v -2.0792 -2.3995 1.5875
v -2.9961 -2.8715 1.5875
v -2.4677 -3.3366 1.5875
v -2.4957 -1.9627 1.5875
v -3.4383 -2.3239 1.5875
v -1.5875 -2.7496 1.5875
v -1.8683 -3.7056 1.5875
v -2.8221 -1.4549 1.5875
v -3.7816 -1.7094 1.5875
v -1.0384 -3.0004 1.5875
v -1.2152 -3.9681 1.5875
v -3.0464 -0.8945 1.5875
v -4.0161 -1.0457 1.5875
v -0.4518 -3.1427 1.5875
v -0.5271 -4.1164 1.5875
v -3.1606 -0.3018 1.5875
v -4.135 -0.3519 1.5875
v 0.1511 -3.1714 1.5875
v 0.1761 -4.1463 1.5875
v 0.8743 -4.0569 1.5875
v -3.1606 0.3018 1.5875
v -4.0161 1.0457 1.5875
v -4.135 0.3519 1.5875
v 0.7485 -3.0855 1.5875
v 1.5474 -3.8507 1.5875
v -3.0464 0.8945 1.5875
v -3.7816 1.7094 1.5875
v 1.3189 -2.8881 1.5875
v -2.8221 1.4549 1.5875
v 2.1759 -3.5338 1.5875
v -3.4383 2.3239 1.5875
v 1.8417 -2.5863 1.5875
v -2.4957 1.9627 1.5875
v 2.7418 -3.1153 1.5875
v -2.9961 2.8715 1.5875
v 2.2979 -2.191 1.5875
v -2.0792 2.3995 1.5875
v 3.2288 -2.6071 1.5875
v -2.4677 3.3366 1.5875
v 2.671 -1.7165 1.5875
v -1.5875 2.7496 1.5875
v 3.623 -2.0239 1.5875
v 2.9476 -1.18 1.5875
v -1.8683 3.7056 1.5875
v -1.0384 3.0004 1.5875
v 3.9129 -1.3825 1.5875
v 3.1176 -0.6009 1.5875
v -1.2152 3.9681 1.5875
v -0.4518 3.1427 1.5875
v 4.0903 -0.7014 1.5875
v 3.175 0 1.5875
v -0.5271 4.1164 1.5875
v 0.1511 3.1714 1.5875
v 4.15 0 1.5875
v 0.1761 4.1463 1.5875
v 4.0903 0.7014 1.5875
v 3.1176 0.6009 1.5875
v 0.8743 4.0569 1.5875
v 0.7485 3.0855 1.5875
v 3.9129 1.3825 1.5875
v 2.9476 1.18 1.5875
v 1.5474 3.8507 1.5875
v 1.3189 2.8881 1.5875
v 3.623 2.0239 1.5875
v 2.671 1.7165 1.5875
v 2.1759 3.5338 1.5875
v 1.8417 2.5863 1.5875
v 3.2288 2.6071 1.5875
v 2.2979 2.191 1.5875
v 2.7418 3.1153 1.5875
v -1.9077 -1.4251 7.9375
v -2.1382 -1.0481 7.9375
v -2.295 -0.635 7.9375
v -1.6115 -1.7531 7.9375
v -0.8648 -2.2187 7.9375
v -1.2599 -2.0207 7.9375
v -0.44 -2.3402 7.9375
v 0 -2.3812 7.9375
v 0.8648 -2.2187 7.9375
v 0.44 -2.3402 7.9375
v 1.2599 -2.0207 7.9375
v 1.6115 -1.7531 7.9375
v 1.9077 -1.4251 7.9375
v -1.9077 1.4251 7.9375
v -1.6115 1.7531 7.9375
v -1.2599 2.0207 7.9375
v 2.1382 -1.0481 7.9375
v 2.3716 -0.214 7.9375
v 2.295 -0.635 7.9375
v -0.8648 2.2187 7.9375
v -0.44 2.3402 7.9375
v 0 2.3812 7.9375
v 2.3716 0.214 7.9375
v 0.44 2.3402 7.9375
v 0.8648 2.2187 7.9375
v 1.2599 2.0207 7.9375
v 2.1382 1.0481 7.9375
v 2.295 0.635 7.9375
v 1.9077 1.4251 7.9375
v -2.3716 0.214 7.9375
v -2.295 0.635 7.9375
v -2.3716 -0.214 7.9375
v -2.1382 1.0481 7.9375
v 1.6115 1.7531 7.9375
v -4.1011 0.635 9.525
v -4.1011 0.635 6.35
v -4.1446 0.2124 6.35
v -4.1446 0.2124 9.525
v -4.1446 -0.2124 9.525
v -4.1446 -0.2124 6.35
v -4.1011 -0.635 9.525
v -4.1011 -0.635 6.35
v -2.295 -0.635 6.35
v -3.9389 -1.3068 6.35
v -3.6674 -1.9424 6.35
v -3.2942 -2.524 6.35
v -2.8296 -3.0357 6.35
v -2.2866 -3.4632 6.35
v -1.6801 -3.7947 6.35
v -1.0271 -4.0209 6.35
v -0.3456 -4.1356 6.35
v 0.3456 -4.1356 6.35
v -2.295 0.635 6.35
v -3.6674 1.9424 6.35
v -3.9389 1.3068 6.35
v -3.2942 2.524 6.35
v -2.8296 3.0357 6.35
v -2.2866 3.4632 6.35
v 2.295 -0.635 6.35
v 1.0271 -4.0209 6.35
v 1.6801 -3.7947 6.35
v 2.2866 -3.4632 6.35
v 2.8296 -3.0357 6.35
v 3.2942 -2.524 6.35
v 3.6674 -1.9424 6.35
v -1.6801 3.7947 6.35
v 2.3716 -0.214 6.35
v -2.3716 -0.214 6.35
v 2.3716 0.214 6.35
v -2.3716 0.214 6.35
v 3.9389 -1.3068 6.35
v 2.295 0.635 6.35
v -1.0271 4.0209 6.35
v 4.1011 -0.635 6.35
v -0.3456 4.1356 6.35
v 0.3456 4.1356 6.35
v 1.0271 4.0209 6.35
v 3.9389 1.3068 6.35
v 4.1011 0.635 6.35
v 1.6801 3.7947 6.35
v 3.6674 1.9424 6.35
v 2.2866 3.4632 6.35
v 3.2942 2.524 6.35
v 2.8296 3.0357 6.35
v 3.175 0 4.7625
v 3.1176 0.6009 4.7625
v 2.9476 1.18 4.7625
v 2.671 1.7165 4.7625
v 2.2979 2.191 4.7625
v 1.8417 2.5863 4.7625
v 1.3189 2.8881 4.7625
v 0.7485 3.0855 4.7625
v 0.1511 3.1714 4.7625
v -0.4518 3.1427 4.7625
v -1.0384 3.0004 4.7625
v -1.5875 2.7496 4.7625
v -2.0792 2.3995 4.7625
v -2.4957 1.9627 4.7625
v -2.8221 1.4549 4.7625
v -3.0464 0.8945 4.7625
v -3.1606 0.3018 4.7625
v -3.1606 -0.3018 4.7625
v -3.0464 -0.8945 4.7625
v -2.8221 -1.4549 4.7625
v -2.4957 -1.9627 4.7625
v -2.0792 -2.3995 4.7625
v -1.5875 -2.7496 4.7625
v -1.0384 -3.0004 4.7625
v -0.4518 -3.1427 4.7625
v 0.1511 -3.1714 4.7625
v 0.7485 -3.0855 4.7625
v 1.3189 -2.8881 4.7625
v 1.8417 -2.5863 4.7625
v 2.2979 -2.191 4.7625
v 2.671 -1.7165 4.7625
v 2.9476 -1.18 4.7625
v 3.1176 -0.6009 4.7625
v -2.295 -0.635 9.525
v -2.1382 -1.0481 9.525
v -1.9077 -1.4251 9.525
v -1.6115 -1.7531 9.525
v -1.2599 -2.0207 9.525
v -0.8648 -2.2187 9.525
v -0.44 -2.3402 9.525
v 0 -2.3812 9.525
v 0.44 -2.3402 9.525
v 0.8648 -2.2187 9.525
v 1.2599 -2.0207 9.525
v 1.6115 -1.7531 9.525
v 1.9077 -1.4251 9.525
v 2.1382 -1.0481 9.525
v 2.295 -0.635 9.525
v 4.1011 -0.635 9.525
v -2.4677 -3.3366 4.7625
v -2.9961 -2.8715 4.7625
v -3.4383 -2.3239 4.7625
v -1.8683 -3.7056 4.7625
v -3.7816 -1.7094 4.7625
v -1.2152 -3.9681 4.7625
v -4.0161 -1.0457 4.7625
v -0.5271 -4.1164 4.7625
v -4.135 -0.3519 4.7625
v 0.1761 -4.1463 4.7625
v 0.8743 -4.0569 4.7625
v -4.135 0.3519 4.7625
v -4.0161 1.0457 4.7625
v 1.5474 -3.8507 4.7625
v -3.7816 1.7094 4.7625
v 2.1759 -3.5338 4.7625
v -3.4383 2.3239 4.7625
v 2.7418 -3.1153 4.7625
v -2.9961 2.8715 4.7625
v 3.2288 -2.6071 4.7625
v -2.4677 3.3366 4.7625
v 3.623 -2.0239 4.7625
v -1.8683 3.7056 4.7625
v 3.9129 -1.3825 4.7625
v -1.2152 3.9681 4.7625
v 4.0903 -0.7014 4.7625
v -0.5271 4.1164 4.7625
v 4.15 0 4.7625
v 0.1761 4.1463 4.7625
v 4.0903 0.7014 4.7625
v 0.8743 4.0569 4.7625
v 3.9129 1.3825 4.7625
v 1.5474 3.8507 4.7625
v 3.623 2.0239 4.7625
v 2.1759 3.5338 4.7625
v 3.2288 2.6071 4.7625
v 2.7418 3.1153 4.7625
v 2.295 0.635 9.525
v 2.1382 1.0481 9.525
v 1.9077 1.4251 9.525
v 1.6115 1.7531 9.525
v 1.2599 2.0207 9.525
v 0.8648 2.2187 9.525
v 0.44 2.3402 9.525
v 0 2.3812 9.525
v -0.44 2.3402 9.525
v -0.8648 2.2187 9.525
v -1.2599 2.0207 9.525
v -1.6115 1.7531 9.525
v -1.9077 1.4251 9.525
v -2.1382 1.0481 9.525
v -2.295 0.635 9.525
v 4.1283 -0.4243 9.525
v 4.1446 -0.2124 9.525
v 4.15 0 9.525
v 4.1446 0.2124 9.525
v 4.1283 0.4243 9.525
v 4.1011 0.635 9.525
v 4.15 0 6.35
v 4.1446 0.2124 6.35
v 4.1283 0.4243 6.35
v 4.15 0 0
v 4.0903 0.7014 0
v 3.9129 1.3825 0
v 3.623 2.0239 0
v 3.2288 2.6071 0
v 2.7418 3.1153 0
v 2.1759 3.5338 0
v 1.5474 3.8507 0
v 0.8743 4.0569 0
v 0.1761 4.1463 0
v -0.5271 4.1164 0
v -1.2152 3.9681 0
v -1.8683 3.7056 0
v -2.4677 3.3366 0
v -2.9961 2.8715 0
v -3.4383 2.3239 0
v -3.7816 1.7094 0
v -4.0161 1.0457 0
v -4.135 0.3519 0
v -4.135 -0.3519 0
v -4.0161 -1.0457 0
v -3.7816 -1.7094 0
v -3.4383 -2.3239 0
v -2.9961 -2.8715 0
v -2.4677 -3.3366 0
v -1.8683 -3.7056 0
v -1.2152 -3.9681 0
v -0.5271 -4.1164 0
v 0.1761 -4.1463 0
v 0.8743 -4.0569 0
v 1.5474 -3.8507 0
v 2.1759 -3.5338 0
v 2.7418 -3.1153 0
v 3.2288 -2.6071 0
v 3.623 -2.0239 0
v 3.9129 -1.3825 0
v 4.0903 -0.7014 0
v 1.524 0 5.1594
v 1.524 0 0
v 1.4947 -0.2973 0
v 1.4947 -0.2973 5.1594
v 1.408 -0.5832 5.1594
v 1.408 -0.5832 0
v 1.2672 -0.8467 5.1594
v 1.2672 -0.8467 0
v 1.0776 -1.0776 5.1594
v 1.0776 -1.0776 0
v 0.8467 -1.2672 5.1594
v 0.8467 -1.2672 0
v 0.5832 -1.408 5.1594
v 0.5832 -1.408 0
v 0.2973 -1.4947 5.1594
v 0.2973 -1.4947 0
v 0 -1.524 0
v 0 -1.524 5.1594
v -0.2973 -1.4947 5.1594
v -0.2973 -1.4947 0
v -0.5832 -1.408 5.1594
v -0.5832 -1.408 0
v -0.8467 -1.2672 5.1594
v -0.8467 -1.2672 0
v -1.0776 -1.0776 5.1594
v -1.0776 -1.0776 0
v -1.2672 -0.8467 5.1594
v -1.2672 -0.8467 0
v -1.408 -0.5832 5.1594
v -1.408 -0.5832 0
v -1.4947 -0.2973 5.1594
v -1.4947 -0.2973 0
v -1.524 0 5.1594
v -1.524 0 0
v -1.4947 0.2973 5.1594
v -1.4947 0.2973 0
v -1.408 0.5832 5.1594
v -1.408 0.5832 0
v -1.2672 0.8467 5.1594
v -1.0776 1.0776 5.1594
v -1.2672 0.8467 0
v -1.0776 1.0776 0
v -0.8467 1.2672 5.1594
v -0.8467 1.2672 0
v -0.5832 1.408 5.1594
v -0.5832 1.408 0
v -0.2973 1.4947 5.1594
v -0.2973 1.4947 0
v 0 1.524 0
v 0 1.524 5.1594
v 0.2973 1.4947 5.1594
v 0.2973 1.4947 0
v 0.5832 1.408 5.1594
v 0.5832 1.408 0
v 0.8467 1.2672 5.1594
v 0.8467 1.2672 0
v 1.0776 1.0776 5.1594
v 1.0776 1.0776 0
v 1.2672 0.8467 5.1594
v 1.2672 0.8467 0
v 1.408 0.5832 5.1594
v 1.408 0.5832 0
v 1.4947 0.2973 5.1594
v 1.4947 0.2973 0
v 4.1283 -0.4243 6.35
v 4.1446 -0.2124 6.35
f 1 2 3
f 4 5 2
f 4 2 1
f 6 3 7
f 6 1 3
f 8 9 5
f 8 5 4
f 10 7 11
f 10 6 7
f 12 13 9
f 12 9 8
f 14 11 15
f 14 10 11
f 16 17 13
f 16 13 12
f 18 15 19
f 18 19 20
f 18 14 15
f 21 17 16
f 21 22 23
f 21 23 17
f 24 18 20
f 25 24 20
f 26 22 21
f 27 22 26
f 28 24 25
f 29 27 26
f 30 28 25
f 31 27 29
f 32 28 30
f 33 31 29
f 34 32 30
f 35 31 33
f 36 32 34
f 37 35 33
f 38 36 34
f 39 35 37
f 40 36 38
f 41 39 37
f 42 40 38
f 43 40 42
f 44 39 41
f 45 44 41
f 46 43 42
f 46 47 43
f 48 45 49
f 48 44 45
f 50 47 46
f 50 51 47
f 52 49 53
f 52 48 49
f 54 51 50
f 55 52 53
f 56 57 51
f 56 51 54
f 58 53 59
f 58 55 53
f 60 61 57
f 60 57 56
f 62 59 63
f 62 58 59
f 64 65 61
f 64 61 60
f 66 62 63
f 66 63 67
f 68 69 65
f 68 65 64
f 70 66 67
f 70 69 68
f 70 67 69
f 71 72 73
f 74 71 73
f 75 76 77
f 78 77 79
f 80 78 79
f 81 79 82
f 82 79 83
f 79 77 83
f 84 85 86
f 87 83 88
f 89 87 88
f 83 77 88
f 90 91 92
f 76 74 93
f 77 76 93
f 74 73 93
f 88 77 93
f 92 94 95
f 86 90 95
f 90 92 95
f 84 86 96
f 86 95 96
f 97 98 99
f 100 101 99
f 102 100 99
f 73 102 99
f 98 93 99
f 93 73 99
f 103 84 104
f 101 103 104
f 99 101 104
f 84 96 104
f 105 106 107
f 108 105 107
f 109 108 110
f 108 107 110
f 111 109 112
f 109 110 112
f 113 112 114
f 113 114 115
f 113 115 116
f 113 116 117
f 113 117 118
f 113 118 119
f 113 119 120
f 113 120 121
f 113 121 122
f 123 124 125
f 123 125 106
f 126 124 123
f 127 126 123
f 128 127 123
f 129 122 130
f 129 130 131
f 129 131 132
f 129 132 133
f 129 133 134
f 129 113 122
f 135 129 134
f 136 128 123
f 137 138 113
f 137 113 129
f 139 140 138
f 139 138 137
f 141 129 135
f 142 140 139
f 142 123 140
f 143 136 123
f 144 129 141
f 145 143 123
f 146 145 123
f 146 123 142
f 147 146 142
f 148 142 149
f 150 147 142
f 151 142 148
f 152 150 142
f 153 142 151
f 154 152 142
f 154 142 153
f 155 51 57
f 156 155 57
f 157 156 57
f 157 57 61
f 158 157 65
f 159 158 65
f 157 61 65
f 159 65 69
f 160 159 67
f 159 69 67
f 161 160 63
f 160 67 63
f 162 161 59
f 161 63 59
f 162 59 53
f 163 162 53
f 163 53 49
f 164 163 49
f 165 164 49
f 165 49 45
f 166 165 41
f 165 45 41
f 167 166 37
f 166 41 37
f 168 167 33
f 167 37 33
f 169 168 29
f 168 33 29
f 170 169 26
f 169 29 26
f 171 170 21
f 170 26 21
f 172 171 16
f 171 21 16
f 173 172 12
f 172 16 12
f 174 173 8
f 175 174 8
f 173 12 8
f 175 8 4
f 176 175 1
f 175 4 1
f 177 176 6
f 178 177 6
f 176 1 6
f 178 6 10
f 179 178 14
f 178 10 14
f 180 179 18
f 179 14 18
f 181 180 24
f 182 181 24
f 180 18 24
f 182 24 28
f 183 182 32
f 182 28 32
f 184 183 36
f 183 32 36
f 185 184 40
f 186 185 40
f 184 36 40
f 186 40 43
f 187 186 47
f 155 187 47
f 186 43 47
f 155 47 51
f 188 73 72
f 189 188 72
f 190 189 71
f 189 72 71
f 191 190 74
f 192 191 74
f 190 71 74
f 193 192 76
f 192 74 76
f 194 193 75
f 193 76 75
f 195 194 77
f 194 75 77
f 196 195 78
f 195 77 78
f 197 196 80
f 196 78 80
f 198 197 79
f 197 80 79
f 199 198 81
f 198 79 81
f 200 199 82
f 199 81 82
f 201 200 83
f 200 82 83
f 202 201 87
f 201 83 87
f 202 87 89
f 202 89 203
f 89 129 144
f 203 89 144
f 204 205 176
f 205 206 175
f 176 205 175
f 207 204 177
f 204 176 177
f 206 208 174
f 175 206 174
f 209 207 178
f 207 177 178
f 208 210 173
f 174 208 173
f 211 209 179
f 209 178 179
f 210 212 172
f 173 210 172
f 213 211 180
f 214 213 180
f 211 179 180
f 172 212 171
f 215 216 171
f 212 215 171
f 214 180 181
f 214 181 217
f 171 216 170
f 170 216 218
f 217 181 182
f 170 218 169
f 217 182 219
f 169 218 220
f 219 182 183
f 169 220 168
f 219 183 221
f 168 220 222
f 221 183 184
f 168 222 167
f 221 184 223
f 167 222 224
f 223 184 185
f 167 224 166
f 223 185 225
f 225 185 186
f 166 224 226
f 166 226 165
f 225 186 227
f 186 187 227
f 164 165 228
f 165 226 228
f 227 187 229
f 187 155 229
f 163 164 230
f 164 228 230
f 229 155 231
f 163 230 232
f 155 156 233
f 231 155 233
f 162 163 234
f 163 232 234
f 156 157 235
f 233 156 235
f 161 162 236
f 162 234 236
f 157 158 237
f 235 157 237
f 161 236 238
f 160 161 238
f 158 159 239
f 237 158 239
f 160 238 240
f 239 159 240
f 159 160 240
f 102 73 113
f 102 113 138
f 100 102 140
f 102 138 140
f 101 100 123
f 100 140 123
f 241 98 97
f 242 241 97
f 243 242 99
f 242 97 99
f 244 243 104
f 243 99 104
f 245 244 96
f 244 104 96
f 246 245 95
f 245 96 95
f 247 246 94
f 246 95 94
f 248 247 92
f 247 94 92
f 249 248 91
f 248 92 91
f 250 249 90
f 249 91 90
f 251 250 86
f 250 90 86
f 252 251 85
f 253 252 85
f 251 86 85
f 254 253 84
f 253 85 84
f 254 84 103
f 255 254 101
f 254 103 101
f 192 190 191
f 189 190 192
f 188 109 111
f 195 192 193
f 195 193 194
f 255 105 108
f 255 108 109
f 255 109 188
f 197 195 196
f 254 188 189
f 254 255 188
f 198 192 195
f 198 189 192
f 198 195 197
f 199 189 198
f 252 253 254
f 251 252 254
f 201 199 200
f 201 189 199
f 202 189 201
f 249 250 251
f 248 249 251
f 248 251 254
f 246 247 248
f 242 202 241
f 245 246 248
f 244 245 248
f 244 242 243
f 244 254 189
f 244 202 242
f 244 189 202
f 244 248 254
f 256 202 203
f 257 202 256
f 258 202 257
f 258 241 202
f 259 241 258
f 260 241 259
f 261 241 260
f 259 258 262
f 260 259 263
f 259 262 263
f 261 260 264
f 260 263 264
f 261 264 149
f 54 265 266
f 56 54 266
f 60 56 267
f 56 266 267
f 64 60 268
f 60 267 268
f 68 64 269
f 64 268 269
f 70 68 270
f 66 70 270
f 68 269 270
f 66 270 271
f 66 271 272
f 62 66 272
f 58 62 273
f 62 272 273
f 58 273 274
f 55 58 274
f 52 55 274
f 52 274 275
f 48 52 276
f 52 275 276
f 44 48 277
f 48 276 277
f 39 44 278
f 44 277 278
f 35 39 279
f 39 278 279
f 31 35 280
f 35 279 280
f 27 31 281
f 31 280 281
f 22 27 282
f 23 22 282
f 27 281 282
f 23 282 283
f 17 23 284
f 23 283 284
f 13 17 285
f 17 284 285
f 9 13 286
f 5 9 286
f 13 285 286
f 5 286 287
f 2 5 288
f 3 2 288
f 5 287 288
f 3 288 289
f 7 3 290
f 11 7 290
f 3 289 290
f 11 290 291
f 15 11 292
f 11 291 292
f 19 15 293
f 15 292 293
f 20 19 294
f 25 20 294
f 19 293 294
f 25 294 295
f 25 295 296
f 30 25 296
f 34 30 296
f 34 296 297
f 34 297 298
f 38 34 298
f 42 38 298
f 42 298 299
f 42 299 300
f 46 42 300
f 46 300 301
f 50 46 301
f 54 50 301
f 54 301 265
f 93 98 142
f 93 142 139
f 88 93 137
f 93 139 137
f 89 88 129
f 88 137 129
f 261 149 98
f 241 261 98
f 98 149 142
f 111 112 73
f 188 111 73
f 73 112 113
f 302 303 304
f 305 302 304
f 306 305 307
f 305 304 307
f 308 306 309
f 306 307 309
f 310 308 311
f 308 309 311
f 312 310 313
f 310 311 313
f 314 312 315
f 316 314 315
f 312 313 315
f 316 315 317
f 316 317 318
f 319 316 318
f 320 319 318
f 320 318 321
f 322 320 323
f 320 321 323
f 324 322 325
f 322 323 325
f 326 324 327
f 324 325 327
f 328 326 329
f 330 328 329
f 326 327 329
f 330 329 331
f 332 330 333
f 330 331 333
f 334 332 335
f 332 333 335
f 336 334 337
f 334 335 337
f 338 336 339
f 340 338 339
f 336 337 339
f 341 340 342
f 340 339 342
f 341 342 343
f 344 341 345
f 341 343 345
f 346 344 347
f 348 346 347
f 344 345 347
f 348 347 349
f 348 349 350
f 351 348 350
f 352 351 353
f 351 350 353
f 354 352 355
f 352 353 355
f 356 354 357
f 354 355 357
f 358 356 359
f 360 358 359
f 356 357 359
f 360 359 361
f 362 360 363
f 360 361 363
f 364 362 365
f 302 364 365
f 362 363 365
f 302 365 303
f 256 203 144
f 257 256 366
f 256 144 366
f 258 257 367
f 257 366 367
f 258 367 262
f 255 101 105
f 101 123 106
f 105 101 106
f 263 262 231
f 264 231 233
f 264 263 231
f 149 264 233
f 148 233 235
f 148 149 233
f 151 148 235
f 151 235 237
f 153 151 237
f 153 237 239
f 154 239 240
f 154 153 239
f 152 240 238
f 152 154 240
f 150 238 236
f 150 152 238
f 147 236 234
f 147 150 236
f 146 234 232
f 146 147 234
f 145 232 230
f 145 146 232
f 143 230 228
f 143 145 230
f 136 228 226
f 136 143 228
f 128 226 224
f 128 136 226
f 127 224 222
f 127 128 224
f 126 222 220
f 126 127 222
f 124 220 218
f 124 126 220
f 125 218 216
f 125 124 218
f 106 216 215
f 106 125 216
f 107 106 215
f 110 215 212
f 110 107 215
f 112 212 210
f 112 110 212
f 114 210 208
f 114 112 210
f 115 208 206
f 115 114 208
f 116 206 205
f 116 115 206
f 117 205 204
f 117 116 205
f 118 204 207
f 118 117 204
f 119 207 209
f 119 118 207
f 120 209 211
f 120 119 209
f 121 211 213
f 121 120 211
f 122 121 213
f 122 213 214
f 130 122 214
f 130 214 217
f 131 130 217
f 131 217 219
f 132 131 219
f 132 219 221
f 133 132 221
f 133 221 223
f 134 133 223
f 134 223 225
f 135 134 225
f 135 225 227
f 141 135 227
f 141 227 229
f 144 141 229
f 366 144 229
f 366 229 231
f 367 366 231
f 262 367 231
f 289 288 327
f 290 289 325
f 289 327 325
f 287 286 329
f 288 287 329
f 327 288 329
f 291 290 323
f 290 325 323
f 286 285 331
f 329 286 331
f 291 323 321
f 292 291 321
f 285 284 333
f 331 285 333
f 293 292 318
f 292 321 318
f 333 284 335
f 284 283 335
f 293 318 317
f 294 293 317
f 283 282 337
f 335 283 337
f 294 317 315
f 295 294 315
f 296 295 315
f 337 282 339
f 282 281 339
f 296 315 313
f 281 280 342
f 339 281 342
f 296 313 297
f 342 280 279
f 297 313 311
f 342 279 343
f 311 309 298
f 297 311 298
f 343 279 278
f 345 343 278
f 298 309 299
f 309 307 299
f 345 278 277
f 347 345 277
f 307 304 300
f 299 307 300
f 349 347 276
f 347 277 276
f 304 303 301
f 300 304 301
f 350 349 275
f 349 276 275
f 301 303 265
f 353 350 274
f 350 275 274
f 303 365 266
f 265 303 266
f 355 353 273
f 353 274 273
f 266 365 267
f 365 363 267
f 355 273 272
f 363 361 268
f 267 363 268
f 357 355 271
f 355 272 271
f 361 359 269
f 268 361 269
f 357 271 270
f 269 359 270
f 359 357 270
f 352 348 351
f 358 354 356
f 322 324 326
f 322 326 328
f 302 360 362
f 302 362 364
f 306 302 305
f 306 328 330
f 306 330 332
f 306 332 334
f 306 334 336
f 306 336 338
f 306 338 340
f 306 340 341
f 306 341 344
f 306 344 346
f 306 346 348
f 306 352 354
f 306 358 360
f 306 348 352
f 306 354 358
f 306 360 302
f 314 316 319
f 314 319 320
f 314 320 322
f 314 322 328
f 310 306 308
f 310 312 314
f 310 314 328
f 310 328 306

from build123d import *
from build123d import SkipClean  # not in build123d's __all__

# Parameters (mm, degrees)
F0_R      = 4.15
F1_DEPTH  = 1.5875
F3_R      = 4.15
F4_DEPTH  = 1.5875
F6_R      = 2.38125
F7_DEPTH  = 1.5875
F9_DEPTH  = 3.175
F10_R     = 3.175
F11_DEPTH = 3.175
F12_R     = 1.524
F13_DEPTH = 5.159375


# Not quite as in the source:
# - after a boolean that leaves OpenCascade's solid faulty, fix() repairs it


with BuildPart() as f1:
    # F0 (on Top) → F1 (new body)
    with BuildSketch(Plane.XY):
        Circle(F0_R)
    extrude(amount=F1_DEPTH)



with BuildPart() as f4:
    # F3 (on offset) → F4 (new body)
    with BuildSketch(Plane.XY.offset(6.35)):
        Circle(F3_R)
    extrude(amount=-F4_DEPTH)



with BuildPart() as f7:
    # F6 (on offset) → F7 (new body)
    with BuildSketch(Plane.XY.offset(7.9375)):
        Circle(F6_R)
    extrude(amount=F7_DEPTH)


with BuildPart() as f4_1:
    add(f4.part, clean=False)

    add(f7.part)  # F9 merges F7
    # F8 (on face) → F9 (join, through all)
    with BuildSketch(Plane.XY.offset(6.35)):
        with BuildLine():
            Line((2.2950221268, -0.635), (4.1011309416, -0.635))
            ThreePointArc((4.1011309416, -0.635), (4.1377646989, -0.3184388422), (4.15, 0))
            ThreePointArc((4.15, 0), (4.1377646989, 0.3184388422), (4.1011309416, 0.635))
            Line((4.1011309416, 0.635), (2.2950221268, 0.635))
            ThreePointArc((2.2950221268, 0.635), (2.38125, 0), (2.2950221268, -0.635))
        make_face()
        with BuildLine():
            ThreePointArc((-4.1011309416, 0.635), (-4.15, 0), (-4.1011309416, -0.635))
            Line((-4.1011309416, -0.635), (-2.2950221268, -0.635))
            ThreePointArc((-2.2950221268, -0.635), (-2.38125, 0), (-2.2950221268, 0.635))
            Line((-2.2950221268, 0.635), (-4.1011309416, 0.635))
        make_face()
    extrude(amount=F9_DEPTH)

    add(f4_1.part.fix(), mode=Mode.REPLACE)


with BuildPart() as f1_1:
    add(f1.part, clean=False)

    add(f4_1.part)  # F11 merges F4
    # F10 (on face) → F11 (join, through all)
    with BuildSketch(Plane.XY.offset(1.5875)):
        Circle(F10_R)
    extrude(amount=F11_DEPTH)

    # F12 (on face) → F13 (cut)
    with BuildSketch(Plane(origin=(0, 0, 0), x_dir=(1, 0, 0), z_dir=(0, 0, -1))):
        Circle(F12_R)
    with SkipClean():  # cleaning this boolean's faces spoils the solid; the shape is the same uncleaned
        extrude(amount=-F13_DEPTH, mode=Mode.SUBTRACT)


solid = f1_1.part
